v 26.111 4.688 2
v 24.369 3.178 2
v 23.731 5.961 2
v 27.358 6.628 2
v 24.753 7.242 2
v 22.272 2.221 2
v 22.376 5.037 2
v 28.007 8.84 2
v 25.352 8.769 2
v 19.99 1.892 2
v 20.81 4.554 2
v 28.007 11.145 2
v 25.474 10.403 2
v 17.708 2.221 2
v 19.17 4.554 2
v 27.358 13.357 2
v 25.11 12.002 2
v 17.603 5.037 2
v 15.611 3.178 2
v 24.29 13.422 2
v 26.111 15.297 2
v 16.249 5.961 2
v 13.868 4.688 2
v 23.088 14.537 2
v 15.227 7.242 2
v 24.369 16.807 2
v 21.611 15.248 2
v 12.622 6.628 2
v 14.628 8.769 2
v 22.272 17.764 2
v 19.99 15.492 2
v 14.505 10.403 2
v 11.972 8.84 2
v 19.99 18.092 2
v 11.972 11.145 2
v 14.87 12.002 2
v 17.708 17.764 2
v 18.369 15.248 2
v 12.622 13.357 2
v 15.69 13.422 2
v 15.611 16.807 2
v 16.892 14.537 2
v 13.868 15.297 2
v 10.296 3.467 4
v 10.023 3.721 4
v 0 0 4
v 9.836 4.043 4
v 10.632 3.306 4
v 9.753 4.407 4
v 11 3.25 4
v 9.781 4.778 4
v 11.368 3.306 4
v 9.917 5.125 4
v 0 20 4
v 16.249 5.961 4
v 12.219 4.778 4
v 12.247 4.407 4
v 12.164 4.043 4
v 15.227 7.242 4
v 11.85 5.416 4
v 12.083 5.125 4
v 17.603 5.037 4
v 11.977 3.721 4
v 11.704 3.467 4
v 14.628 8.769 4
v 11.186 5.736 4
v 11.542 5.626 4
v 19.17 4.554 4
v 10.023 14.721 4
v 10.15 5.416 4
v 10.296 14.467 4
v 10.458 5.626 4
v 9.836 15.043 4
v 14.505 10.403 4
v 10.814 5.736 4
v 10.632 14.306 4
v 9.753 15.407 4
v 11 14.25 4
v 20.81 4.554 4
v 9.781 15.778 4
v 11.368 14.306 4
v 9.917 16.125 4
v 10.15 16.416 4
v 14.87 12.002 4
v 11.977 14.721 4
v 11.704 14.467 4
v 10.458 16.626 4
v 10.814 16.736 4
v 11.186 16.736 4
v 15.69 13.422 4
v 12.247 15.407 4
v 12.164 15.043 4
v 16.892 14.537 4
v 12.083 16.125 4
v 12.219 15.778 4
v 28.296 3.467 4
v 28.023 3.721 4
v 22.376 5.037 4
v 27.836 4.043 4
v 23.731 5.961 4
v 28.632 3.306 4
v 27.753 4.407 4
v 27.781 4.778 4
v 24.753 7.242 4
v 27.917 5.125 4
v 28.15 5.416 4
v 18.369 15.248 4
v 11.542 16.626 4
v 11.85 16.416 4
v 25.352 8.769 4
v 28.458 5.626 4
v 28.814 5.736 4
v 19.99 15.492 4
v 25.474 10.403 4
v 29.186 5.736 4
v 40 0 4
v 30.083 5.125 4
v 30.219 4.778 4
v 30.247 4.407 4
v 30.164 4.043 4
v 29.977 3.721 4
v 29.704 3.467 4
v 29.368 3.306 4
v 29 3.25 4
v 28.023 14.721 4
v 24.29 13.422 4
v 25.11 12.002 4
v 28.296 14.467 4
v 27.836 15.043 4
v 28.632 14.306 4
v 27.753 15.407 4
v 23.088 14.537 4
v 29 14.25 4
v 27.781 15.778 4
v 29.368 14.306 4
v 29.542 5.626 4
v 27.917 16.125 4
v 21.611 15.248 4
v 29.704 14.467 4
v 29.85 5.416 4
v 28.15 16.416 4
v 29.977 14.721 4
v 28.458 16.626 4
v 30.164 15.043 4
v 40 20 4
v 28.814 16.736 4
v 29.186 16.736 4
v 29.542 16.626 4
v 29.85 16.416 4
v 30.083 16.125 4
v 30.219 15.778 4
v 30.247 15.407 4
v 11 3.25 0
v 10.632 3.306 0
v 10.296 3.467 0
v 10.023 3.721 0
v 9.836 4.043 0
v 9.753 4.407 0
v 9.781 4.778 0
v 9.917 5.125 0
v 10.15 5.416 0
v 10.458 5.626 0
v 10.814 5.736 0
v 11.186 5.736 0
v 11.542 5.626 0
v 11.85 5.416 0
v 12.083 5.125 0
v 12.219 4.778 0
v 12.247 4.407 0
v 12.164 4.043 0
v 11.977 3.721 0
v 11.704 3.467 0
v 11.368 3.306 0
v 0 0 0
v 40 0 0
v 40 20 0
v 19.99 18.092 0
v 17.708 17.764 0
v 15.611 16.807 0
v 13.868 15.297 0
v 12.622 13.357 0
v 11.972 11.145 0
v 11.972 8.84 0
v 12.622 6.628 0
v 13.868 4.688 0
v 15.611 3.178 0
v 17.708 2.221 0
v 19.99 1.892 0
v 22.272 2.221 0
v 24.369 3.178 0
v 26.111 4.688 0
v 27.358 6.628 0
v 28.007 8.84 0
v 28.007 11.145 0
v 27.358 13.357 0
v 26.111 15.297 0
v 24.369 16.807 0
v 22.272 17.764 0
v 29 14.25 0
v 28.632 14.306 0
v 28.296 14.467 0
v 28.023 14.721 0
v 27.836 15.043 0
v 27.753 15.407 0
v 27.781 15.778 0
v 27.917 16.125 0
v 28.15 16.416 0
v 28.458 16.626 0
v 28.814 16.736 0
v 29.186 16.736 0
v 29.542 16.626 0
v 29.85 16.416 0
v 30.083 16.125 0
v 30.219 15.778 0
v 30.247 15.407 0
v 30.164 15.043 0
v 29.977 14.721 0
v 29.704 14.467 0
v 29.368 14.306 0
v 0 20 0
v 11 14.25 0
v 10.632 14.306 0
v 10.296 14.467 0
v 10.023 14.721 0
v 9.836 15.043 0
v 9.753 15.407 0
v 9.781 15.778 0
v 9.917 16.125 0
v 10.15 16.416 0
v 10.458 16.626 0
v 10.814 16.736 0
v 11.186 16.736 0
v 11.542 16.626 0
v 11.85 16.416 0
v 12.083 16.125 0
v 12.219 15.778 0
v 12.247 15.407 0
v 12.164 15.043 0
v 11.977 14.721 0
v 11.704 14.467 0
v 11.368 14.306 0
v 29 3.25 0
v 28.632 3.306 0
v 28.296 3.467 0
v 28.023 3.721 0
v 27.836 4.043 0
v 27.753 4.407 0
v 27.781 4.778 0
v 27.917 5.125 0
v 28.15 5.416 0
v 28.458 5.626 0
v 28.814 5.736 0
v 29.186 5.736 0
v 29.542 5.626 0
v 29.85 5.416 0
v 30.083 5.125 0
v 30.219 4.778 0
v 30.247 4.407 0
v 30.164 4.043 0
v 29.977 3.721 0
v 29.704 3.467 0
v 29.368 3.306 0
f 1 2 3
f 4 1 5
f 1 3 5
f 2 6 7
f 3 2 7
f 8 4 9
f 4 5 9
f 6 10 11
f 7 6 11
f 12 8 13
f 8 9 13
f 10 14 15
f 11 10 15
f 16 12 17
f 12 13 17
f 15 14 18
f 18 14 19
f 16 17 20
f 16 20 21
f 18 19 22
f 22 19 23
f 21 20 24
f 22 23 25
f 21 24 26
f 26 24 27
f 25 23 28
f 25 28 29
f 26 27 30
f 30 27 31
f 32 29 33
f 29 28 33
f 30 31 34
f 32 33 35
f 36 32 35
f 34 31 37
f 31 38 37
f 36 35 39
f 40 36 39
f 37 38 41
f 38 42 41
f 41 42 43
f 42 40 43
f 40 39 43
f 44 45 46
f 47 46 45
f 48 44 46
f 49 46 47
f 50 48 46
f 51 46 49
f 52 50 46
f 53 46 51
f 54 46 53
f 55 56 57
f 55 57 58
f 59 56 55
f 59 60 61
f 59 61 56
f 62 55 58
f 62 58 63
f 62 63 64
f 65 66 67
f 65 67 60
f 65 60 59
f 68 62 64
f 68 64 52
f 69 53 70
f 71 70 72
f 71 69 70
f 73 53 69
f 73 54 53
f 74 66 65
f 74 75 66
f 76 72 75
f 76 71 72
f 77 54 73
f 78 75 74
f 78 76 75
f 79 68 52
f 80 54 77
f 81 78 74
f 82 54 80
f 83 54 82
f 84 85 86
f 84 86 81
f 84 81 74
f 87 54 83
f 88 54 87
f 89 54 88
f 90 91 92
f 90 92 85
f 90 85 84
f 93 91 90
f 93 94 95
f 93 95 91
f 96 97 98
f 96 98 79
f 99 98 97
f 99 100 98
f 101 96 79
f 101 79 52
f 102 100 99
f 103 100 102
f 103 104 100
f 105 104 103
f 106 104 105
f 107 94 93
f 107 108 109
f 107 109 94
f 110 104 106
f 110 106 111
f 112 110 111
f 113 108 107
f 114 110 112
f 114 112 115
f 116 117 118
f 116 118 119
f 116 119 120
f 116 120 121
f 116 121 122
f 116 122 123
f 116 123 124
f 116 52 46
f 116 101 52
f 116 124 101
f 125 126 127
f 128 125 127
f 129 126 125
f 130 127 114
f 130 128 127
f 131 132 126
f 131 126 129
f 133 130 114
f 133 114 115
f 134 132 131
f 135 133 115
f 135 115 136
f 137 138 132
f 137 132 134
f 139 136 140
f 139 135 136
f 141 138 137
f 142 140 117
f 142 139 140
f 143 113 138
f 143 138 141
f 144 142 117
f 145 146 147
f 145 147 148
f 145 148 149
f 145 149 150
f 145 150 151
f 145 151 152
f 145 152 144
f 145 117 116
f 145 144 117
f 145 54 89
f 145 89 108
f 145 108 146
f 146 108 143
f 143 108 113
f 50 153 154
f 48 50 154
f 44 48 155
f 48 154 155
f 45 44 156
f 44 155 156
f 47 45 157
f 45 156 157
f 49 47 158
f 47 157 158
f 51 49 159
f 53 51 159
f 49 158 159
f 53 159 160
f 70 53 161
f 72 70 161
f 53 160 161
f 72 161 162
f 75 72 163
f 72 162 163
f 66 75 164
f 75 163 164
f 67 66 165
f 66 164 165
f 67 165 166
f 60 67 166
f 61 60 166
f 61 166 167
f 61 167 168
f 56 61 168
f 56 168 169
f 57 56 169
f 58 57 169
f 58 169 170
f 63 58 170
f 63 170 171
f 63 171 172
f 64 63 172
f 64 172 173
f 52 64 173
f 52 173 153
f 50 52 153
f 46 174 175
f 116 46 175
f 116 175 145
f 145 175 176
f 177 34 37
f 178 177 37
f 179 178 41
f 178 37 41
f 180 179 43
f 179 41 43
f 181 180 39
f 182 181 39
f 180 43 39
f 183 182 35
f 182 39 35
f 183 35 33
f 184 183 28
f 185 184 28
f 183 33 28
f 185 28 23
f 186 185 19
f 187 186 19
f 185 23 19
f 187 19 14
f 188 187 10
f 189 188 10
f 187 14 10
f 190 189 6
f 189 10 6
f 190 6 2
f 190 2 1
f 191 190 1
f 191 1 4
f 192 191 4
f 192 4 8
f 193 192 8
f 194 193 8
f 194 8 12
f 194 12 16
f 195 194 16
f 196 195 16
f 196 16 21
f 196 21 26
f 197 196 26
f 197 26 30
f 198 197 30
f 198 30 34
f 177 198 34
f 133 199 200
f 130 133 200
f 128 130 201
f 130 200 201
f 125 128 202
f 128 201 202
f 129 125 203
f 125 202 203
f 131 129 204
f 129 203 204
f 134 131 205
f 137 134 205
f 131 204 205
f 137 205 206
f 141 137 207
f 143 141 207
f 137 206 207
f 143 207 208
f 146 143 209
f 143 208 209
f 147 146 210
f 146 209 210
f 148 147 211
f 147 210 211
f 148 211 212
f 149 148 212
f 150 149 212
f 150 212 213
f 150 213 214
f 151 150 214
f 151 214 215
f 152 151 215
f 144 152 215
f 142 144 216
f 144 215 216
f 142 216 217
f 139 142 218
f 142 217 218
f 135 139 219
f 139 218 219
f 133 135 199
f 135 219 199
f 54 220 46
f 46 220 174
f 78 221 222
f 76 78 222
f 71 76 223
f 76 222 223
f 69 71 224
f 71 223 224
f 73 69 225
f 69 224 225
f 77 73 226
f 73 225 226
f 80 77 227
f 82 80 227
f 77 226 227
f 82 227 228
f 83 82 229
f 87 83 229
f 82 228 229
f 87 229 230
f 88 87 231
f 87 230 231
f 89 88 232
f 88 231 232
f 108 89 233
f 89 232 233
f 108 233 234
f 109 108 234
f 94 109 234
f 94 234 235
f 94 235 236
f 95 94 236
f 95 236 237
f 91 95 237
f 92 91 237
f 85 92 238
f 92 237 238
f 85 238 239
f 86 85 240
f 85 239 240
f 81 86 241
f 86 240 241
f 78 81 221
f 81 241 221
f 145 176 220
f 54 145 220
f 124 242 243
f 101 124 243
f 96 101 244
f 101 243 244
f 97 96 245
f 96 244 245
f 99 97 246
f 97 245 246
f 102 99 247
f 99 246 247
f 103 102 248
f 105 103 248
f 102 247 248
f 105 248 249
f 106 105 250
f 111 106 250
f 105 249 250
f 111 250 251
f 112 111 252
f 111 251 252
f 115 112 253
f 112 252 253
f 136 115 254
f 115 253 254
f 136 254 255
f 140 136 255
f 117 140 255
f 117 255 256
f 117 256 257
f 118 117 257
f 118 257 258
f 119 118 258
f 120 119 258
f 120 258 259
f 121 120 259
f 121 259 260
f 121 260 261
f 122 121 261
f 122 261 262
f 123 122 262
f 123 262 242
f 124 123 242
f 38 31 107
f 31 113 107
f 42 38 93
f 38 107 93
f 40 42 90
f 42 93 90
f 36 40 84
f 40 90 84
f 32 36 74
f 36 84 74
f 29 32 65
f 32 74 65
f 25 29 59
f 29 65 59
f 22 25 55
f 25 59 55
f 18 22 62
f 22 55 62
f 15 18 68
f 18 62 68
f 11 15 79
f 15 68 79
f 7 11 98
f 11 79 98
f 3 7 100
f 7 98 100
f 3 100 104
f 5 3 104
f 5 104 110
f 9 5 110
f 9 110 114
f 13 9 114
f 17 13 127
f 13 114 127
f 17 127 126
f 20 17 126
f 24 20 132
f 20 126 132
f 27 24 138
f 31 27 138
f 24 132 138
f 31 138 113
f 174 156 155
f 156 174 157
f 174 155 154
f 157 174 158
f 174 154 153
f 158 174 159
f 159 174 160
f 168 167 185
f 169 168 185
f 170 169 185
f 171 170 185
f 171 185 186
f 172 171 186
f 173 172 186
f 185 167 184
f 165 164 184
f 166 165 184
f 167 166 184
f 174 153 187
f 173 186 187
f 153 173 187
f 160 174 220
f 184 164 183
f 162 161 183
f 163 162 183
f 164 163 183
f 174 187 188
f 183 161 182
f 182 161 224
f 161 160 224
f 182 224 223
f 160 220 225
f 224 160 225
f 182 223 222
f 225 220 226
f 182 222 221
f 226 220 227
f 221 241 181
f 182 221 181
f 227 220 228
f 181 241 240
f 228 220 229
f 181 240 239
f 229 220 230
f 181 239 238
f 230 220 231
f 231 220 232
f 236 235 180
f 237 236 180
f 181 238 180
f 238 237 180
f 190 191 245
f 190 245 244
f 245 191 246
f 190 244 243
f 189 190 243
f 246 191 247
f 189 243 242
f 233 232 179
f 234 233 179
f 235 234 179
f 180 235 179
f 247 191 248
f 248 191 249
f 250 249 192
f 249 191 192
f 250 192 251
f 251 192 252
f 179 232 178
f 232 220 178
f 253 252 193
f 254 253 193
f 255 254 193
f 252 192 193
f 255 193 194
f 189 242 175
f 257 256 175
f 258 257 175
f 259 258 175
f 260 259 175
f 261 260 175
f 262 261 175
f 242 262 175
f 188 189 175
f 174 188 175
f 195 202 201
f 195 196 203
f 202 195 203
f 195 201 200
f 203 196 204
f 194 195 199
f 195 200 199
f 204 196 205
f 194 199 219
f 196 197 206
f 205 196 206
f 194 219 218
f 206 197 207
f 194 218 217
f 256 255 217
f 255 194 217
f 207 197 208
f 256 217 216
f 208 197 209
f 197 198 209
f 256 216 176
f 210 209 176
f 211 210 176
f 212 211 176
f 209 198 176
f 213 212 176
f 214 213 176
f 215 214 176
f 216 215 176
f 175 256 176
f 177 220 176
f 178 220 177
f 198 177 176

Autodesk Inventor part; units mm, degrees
ref_plane "YZ Plane" through (0, 0, 0) normal (1, 0, 0) x (0, 1, 0)
ref_plane "XZ Plane" through (0, 0, 0) normal (0, 1, 0) x (-1, 0, 0)
ref_plane "XY Plane" through (0, 0, 0) normal (0, 0, 1) x (1, 0, 0)
sketch "Sketch1" plane through (0, 0, 0) normal (0, 0, 1) x (1, 0, 0)
  line L0 (0, 0) -> (40, 0)
  line L1 (40, 0) -> (40, 20)
  line L2 (40, 20) -> (0, 20)
  line L3 (0, 20) -> (0, 0)
  dimension "d0" = 40
  dimension "d1" = 20
extrude "Extrusion1" add sketch "Sketch1" along normal blind 4
sketch "Sketch3" plane through (0, 0, 4) normal (0, 0, 1) x (1, 0, 0)
  line L0 (40, 20) -> (0, 20) projected
  line L1 (0, 20) -> (0, 0) projected
  point P0 (11, 15.5)
  dimension "d41" = 4.5
  dimension "d42" = 11
hole "Hole2" at (11, 15.5, 4) direction (0, 0, -1) diameter 2.5 end through all
sketch "Sketch4" plane through (0, 0, 4) normal (0, 0, 1) x (1, 0, 0)
  line L0 (0, 20) -> (0, 0) projected
  line L1 (0, 0) -> (40, 0) projected
  point P0 (11, 4.5)
  dimension "d43" = 11
  dimension "d44" = 4.5
hole "Hole3" at (11, 4.5, 4) direction (0, 0, -1) diameter 2.5 end through all
sketch "Sketch5" plane through (0, 0, 4) normal (0, 0, 1) x (1, 0, 0)
  line L0 (40, 0) -> (40, 20) projected
  line L1 (40, 20) -> (0, 20) projected
  point P0 (0, 0)
  point P1 (29, 15.5)
  dimension "d45" = 11
  dimension "d46" = 4.5
hole "Hole4" at (29, 15.5, 4) direction (0, 0, -1) diameter 2.5 end through all
sketch "Sketch6" plane through (0, 0, 4) normal (0, 0, 1) x (1, 0, 0)
  line L0 (40, 0) -> (40, 20) projected
  line L1 (0, 0) -> (40, 0) projected
  point P0 (29, 4.5)
  dimension "d47" = 11
  dimension "d48" = 4.5
hole "Hole5" at (29, 4.5, 4) direction (0, 0, -1) diameter 2.5 end through all
sketch "Sketch7" plane through (0, 0, 0) normal (0, 0, -1) x (-1, 0, 0)
  line L0 (0, 20) -> (0, 0) projected
  line L1 (-40, 20) -> (0, 20) projected
  point P0 (-19.9898, 9.9924)
  dimension "d56" = 19.9898
  dimension "d57" = 10.0076
hole "Hole6" at (19.9898, 9.9924, 0) direction (0, 0, 1) diameter 11 end through all counterbore diameter 16.2 counterbore depth 2
properties part number "bottom_g2v1"
